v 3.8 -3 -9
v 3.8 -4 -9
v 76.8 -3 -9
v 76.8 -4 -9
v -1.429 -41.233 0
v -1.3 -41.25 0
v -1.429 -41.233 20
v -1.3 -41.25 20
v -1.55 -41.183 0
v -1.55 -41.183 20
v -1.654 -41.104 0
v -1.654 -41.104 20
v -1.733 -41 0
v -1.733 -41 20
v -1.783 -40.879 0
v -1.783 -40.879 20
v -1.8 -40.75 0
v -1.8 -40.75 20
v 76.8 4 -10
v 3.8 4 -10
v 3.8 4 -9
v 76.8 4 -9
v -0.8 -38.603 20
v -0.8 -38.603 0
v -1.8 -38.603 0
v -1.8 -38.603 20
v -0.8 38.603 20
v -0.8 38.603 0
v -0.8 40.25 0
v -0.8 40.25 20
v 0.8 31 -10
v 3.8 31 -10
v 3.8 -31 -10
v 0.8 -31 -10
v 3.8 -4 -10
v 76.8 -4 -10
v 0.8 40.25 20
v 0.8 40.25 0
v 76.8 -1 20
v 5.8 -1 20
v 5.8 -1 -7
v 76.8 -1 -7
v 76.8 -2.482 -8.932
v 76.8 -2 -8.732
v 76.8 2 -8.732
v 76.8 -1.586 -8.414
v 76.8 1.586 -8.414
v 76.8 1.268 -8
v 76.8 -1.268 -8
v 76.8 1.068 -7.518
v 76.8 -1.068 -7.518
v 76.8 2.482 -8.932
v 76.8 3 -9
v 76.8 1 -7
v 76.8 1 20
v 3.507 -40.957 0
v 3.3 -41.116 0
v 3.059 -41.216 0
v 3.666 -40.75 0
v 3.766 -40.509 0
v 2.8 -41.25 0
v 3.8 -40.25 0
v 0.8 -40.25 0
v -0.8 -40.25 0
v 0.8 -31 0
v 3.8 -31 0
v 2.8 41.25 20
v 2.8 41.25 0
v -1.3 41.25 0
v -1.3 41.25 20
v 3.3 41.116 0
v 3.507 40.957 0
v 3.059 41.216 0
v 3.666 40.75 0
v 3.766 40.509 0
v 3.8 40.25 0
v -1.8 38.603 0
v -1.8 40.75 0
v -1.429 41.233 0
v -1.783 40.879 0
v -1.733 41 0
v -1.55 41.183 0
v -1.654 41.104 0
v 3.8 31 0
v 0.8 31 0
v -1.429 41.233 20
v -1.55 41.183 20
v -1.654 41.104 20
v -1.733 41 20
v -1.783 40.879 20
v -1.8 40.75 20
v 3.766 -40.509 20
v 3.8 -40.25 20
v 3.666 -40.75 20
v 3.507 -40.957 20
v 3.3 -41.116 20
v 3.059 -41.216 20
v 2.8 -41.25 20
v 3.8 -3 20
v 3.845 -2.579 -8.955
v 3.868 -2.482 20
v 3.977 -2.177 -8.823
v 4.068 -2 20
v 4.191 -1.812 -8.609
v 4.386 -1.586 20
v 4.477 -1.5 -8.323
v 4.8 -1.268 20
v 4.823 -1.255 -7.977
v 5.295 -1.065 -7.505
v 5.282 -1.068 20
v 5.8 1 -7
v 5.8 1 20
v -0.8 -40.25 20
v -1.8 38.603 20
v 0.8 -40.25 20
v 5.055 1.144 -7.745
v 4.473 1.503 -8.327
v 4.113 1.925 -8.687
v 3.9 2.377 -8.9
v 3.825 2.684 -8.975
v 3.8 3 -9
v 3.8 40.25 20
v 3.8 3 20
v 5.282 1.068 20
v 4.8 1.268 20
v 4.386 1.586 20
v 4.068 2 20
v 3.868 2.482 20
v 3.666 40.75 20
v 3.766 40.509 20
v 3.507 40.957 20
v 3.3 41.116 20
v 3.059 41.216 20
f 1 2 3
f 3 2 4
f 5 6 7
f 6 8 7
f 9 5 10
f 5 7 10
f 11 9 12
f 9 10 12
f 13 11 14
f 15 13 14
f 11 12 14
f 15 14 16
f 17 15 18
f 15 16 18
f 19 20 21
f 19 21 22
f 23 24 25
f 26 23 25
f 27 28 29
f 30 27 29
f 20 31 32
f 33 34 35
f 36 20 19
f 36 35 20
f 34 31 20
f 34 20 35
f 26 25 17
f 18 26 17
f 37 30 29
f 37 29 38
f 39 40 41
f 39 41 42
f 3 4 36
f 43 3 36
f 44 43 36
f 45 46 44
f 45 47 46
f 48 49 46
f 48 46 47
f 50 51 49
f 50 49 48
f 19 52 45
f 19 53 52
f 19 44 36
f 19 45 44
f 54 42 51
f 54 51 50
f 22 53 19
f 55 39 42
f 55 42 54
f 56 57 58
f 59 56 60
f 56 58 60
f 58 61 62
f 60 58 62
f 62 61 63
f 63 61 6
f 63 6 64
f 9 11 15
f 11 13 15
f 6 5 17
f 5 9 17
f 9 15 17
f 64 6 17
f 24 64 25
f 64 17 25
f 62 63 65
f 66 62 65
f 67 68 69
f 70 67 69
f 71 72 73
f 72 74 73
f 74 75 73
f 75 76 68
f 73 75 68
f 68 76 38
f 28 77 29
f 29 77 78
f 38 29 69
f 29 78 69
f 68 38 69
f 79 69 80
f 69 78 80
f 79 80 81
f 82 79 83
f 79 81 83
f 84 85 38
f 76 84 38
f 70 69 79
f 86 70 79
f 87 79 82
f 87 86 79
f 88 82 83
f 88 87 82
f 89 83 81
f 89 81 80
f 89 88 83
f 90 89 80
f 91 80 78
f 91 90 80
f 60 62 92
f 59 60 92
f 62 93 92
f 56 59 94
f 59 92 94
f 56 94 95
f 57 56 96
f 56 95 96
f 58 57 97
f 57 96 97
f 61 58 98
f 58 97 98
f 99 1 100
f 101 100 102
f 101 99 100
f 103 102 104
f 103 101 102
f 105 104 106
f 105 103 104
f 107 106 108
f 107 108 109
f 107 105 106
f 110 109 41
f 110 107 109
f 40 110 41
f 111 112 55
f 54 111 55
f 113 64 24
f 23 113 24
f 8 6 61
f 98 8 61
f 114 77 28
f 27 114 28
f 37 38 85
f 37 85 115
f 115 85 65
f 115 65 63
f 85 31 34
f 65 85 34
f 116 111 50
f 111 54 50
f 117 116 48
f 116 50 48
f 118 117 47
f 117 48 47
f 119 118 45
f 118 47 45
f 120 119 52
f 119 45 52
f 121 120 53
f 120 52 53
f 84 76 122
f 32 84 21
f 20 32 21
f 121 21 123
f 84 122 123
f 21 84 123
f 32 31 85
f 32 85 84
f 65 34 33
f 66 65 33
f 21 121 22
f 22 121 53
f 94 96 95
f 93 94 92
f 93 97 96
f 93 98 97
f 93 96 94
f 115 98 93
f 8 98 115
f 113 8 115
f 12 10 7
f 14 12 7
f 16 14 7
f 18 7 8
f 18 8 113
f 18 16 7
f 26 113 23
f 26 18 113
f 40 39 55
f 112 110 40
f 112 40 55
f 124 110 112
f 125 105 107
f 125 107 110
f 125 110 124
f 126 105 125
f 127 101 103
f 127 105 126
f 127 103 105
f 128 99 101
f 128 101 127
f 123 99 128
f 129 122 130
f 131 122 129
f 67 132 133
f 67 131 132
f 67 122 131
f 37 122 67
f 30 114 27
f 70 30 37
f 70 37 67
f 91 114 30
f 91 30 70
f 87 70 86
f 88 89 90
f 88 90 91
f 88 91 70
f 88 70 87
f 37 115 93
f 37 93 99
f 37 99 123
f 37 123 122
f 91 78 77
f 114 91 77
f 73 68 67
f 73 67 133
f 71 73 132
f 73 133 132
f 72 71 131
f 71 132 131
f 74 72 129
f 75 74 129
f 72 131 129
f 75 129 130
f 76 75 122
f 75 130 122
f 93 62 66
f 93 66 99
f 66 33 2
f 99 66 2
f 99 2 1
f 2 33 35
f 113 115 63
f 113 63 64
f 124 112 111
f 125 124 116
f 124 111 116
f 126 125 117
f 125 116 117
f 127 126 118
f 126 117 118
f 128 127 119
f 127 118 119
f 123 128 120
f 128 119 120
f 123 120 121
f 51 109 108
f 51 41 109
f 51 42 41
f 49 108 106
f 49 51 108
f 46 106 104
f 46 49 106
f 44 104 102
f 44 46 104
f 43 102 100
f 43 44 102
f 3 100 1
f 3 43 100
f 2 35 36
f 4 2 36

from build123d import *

# Parameters (mm, degrees)
BOSS_EXTRUDE1_DEPTH = 20
SKETCH3_W           = 76
SKETCH3_H           = 2
BOSS_EXTRUDE2_DEPTH = 30
FILLET2_R           = 1
FILLET3_R           = 0.5
SKETCH4_W           = 3
SKETCH4_H           = 62
BOSS_EXTRUDE3_DEPTH = 10
SKETCH5_W           = 76
SKETCH5_H           = 8
BOSS_EXTRUDE4_DEPTH = 1
FILLET5_R           = 2


with BuildPart() as part:
    # Sketch1 → Boss-Extrude1 (new body)
    with BuildSketch(Plane(origin=(0, 0, 0), x_dir=(0, 1, 0), z_dir=(0, 0, 1))):
        Polygon((-38.603475532, 1.8), (-41.25, 1.8), (-41.25, -3.8), (41.25, -3.8), (41.25, 1.8), (38.603475532, 1.8), (38.603475532, 0.8), (40.25, 0.8), (40.25, -0.8), (-38.603475532, -0.8), (-40.25, -0.8), (-40.25, 0.8), (-38.603475532, 0.8), align=None)
    extrude(amount=BOSS_EXTRUDE1_DEPTH)

    # Sketch3 → Boss-Extrude2 (add)
    with BuildSketch(Plane.XY.offset(20)):
        with Locations((38.8, 0)):
            Rectangle(SKETCH3_W, SKETCH3_H)
    extrude(amount=-BOSS_EXTRUDE2_DEPTH)

    # Fillet2
    fillet2_edges = [part.edges().sort_by_distance(p)[0] for p in [
        (3.8, 41.25, 10),
        (3.8, -41.25, 10),
    ]]
    fillet(fillet2_edges, radius=FILLET2_R)

    # Fillet3
    fillet3_edges = [part.edges().sort_by_distance(p)[0] for p in [
        (-1.8, 41.25, 10),
        (-1.8, -41.25, 10),
    ]]
    fillet(fillet3_edges, radius=FILLET3_R)

    # Sketch4 → Boss-Extrude3 (add)
    with BuildSketch(Plane(origin=(0, 0, 0), x_dir=(1, 0, 0), z_dir=(0, 0, -1))):
        with Locations((2.3, 0)):
            Rectangle(SKETCH4_W, SKETCH4_H)
    extrude(amount=BOSS_EXTRUDE3_DEPTH)

    # Sketch5 → Boss-Extrude4 (add)
    with BuildSketch(Plane(origin=(0, 0, -10), x_dir=(1, 0, 0), z_dir=(0, 0, -1))):
        with Locations((38.8, 0)):
            Rectangle(SKETCH5_W, SKETCH5_H)
    extrude(amount=-BOSS_EXTRUDE4_DEPTH)

    # Fillet5
    fillet5_edges = [part.edges().sort_by_distance(p)[0] for p in [
        (3.8, -1, 5.5),
        (40.3, 1, -9),
        (40.3, -1, -9),
        (3.8, 1, 5.5),
    ]]
    fillet(fillet5_edges, radius=FILLET5_R)


solid = part.part
